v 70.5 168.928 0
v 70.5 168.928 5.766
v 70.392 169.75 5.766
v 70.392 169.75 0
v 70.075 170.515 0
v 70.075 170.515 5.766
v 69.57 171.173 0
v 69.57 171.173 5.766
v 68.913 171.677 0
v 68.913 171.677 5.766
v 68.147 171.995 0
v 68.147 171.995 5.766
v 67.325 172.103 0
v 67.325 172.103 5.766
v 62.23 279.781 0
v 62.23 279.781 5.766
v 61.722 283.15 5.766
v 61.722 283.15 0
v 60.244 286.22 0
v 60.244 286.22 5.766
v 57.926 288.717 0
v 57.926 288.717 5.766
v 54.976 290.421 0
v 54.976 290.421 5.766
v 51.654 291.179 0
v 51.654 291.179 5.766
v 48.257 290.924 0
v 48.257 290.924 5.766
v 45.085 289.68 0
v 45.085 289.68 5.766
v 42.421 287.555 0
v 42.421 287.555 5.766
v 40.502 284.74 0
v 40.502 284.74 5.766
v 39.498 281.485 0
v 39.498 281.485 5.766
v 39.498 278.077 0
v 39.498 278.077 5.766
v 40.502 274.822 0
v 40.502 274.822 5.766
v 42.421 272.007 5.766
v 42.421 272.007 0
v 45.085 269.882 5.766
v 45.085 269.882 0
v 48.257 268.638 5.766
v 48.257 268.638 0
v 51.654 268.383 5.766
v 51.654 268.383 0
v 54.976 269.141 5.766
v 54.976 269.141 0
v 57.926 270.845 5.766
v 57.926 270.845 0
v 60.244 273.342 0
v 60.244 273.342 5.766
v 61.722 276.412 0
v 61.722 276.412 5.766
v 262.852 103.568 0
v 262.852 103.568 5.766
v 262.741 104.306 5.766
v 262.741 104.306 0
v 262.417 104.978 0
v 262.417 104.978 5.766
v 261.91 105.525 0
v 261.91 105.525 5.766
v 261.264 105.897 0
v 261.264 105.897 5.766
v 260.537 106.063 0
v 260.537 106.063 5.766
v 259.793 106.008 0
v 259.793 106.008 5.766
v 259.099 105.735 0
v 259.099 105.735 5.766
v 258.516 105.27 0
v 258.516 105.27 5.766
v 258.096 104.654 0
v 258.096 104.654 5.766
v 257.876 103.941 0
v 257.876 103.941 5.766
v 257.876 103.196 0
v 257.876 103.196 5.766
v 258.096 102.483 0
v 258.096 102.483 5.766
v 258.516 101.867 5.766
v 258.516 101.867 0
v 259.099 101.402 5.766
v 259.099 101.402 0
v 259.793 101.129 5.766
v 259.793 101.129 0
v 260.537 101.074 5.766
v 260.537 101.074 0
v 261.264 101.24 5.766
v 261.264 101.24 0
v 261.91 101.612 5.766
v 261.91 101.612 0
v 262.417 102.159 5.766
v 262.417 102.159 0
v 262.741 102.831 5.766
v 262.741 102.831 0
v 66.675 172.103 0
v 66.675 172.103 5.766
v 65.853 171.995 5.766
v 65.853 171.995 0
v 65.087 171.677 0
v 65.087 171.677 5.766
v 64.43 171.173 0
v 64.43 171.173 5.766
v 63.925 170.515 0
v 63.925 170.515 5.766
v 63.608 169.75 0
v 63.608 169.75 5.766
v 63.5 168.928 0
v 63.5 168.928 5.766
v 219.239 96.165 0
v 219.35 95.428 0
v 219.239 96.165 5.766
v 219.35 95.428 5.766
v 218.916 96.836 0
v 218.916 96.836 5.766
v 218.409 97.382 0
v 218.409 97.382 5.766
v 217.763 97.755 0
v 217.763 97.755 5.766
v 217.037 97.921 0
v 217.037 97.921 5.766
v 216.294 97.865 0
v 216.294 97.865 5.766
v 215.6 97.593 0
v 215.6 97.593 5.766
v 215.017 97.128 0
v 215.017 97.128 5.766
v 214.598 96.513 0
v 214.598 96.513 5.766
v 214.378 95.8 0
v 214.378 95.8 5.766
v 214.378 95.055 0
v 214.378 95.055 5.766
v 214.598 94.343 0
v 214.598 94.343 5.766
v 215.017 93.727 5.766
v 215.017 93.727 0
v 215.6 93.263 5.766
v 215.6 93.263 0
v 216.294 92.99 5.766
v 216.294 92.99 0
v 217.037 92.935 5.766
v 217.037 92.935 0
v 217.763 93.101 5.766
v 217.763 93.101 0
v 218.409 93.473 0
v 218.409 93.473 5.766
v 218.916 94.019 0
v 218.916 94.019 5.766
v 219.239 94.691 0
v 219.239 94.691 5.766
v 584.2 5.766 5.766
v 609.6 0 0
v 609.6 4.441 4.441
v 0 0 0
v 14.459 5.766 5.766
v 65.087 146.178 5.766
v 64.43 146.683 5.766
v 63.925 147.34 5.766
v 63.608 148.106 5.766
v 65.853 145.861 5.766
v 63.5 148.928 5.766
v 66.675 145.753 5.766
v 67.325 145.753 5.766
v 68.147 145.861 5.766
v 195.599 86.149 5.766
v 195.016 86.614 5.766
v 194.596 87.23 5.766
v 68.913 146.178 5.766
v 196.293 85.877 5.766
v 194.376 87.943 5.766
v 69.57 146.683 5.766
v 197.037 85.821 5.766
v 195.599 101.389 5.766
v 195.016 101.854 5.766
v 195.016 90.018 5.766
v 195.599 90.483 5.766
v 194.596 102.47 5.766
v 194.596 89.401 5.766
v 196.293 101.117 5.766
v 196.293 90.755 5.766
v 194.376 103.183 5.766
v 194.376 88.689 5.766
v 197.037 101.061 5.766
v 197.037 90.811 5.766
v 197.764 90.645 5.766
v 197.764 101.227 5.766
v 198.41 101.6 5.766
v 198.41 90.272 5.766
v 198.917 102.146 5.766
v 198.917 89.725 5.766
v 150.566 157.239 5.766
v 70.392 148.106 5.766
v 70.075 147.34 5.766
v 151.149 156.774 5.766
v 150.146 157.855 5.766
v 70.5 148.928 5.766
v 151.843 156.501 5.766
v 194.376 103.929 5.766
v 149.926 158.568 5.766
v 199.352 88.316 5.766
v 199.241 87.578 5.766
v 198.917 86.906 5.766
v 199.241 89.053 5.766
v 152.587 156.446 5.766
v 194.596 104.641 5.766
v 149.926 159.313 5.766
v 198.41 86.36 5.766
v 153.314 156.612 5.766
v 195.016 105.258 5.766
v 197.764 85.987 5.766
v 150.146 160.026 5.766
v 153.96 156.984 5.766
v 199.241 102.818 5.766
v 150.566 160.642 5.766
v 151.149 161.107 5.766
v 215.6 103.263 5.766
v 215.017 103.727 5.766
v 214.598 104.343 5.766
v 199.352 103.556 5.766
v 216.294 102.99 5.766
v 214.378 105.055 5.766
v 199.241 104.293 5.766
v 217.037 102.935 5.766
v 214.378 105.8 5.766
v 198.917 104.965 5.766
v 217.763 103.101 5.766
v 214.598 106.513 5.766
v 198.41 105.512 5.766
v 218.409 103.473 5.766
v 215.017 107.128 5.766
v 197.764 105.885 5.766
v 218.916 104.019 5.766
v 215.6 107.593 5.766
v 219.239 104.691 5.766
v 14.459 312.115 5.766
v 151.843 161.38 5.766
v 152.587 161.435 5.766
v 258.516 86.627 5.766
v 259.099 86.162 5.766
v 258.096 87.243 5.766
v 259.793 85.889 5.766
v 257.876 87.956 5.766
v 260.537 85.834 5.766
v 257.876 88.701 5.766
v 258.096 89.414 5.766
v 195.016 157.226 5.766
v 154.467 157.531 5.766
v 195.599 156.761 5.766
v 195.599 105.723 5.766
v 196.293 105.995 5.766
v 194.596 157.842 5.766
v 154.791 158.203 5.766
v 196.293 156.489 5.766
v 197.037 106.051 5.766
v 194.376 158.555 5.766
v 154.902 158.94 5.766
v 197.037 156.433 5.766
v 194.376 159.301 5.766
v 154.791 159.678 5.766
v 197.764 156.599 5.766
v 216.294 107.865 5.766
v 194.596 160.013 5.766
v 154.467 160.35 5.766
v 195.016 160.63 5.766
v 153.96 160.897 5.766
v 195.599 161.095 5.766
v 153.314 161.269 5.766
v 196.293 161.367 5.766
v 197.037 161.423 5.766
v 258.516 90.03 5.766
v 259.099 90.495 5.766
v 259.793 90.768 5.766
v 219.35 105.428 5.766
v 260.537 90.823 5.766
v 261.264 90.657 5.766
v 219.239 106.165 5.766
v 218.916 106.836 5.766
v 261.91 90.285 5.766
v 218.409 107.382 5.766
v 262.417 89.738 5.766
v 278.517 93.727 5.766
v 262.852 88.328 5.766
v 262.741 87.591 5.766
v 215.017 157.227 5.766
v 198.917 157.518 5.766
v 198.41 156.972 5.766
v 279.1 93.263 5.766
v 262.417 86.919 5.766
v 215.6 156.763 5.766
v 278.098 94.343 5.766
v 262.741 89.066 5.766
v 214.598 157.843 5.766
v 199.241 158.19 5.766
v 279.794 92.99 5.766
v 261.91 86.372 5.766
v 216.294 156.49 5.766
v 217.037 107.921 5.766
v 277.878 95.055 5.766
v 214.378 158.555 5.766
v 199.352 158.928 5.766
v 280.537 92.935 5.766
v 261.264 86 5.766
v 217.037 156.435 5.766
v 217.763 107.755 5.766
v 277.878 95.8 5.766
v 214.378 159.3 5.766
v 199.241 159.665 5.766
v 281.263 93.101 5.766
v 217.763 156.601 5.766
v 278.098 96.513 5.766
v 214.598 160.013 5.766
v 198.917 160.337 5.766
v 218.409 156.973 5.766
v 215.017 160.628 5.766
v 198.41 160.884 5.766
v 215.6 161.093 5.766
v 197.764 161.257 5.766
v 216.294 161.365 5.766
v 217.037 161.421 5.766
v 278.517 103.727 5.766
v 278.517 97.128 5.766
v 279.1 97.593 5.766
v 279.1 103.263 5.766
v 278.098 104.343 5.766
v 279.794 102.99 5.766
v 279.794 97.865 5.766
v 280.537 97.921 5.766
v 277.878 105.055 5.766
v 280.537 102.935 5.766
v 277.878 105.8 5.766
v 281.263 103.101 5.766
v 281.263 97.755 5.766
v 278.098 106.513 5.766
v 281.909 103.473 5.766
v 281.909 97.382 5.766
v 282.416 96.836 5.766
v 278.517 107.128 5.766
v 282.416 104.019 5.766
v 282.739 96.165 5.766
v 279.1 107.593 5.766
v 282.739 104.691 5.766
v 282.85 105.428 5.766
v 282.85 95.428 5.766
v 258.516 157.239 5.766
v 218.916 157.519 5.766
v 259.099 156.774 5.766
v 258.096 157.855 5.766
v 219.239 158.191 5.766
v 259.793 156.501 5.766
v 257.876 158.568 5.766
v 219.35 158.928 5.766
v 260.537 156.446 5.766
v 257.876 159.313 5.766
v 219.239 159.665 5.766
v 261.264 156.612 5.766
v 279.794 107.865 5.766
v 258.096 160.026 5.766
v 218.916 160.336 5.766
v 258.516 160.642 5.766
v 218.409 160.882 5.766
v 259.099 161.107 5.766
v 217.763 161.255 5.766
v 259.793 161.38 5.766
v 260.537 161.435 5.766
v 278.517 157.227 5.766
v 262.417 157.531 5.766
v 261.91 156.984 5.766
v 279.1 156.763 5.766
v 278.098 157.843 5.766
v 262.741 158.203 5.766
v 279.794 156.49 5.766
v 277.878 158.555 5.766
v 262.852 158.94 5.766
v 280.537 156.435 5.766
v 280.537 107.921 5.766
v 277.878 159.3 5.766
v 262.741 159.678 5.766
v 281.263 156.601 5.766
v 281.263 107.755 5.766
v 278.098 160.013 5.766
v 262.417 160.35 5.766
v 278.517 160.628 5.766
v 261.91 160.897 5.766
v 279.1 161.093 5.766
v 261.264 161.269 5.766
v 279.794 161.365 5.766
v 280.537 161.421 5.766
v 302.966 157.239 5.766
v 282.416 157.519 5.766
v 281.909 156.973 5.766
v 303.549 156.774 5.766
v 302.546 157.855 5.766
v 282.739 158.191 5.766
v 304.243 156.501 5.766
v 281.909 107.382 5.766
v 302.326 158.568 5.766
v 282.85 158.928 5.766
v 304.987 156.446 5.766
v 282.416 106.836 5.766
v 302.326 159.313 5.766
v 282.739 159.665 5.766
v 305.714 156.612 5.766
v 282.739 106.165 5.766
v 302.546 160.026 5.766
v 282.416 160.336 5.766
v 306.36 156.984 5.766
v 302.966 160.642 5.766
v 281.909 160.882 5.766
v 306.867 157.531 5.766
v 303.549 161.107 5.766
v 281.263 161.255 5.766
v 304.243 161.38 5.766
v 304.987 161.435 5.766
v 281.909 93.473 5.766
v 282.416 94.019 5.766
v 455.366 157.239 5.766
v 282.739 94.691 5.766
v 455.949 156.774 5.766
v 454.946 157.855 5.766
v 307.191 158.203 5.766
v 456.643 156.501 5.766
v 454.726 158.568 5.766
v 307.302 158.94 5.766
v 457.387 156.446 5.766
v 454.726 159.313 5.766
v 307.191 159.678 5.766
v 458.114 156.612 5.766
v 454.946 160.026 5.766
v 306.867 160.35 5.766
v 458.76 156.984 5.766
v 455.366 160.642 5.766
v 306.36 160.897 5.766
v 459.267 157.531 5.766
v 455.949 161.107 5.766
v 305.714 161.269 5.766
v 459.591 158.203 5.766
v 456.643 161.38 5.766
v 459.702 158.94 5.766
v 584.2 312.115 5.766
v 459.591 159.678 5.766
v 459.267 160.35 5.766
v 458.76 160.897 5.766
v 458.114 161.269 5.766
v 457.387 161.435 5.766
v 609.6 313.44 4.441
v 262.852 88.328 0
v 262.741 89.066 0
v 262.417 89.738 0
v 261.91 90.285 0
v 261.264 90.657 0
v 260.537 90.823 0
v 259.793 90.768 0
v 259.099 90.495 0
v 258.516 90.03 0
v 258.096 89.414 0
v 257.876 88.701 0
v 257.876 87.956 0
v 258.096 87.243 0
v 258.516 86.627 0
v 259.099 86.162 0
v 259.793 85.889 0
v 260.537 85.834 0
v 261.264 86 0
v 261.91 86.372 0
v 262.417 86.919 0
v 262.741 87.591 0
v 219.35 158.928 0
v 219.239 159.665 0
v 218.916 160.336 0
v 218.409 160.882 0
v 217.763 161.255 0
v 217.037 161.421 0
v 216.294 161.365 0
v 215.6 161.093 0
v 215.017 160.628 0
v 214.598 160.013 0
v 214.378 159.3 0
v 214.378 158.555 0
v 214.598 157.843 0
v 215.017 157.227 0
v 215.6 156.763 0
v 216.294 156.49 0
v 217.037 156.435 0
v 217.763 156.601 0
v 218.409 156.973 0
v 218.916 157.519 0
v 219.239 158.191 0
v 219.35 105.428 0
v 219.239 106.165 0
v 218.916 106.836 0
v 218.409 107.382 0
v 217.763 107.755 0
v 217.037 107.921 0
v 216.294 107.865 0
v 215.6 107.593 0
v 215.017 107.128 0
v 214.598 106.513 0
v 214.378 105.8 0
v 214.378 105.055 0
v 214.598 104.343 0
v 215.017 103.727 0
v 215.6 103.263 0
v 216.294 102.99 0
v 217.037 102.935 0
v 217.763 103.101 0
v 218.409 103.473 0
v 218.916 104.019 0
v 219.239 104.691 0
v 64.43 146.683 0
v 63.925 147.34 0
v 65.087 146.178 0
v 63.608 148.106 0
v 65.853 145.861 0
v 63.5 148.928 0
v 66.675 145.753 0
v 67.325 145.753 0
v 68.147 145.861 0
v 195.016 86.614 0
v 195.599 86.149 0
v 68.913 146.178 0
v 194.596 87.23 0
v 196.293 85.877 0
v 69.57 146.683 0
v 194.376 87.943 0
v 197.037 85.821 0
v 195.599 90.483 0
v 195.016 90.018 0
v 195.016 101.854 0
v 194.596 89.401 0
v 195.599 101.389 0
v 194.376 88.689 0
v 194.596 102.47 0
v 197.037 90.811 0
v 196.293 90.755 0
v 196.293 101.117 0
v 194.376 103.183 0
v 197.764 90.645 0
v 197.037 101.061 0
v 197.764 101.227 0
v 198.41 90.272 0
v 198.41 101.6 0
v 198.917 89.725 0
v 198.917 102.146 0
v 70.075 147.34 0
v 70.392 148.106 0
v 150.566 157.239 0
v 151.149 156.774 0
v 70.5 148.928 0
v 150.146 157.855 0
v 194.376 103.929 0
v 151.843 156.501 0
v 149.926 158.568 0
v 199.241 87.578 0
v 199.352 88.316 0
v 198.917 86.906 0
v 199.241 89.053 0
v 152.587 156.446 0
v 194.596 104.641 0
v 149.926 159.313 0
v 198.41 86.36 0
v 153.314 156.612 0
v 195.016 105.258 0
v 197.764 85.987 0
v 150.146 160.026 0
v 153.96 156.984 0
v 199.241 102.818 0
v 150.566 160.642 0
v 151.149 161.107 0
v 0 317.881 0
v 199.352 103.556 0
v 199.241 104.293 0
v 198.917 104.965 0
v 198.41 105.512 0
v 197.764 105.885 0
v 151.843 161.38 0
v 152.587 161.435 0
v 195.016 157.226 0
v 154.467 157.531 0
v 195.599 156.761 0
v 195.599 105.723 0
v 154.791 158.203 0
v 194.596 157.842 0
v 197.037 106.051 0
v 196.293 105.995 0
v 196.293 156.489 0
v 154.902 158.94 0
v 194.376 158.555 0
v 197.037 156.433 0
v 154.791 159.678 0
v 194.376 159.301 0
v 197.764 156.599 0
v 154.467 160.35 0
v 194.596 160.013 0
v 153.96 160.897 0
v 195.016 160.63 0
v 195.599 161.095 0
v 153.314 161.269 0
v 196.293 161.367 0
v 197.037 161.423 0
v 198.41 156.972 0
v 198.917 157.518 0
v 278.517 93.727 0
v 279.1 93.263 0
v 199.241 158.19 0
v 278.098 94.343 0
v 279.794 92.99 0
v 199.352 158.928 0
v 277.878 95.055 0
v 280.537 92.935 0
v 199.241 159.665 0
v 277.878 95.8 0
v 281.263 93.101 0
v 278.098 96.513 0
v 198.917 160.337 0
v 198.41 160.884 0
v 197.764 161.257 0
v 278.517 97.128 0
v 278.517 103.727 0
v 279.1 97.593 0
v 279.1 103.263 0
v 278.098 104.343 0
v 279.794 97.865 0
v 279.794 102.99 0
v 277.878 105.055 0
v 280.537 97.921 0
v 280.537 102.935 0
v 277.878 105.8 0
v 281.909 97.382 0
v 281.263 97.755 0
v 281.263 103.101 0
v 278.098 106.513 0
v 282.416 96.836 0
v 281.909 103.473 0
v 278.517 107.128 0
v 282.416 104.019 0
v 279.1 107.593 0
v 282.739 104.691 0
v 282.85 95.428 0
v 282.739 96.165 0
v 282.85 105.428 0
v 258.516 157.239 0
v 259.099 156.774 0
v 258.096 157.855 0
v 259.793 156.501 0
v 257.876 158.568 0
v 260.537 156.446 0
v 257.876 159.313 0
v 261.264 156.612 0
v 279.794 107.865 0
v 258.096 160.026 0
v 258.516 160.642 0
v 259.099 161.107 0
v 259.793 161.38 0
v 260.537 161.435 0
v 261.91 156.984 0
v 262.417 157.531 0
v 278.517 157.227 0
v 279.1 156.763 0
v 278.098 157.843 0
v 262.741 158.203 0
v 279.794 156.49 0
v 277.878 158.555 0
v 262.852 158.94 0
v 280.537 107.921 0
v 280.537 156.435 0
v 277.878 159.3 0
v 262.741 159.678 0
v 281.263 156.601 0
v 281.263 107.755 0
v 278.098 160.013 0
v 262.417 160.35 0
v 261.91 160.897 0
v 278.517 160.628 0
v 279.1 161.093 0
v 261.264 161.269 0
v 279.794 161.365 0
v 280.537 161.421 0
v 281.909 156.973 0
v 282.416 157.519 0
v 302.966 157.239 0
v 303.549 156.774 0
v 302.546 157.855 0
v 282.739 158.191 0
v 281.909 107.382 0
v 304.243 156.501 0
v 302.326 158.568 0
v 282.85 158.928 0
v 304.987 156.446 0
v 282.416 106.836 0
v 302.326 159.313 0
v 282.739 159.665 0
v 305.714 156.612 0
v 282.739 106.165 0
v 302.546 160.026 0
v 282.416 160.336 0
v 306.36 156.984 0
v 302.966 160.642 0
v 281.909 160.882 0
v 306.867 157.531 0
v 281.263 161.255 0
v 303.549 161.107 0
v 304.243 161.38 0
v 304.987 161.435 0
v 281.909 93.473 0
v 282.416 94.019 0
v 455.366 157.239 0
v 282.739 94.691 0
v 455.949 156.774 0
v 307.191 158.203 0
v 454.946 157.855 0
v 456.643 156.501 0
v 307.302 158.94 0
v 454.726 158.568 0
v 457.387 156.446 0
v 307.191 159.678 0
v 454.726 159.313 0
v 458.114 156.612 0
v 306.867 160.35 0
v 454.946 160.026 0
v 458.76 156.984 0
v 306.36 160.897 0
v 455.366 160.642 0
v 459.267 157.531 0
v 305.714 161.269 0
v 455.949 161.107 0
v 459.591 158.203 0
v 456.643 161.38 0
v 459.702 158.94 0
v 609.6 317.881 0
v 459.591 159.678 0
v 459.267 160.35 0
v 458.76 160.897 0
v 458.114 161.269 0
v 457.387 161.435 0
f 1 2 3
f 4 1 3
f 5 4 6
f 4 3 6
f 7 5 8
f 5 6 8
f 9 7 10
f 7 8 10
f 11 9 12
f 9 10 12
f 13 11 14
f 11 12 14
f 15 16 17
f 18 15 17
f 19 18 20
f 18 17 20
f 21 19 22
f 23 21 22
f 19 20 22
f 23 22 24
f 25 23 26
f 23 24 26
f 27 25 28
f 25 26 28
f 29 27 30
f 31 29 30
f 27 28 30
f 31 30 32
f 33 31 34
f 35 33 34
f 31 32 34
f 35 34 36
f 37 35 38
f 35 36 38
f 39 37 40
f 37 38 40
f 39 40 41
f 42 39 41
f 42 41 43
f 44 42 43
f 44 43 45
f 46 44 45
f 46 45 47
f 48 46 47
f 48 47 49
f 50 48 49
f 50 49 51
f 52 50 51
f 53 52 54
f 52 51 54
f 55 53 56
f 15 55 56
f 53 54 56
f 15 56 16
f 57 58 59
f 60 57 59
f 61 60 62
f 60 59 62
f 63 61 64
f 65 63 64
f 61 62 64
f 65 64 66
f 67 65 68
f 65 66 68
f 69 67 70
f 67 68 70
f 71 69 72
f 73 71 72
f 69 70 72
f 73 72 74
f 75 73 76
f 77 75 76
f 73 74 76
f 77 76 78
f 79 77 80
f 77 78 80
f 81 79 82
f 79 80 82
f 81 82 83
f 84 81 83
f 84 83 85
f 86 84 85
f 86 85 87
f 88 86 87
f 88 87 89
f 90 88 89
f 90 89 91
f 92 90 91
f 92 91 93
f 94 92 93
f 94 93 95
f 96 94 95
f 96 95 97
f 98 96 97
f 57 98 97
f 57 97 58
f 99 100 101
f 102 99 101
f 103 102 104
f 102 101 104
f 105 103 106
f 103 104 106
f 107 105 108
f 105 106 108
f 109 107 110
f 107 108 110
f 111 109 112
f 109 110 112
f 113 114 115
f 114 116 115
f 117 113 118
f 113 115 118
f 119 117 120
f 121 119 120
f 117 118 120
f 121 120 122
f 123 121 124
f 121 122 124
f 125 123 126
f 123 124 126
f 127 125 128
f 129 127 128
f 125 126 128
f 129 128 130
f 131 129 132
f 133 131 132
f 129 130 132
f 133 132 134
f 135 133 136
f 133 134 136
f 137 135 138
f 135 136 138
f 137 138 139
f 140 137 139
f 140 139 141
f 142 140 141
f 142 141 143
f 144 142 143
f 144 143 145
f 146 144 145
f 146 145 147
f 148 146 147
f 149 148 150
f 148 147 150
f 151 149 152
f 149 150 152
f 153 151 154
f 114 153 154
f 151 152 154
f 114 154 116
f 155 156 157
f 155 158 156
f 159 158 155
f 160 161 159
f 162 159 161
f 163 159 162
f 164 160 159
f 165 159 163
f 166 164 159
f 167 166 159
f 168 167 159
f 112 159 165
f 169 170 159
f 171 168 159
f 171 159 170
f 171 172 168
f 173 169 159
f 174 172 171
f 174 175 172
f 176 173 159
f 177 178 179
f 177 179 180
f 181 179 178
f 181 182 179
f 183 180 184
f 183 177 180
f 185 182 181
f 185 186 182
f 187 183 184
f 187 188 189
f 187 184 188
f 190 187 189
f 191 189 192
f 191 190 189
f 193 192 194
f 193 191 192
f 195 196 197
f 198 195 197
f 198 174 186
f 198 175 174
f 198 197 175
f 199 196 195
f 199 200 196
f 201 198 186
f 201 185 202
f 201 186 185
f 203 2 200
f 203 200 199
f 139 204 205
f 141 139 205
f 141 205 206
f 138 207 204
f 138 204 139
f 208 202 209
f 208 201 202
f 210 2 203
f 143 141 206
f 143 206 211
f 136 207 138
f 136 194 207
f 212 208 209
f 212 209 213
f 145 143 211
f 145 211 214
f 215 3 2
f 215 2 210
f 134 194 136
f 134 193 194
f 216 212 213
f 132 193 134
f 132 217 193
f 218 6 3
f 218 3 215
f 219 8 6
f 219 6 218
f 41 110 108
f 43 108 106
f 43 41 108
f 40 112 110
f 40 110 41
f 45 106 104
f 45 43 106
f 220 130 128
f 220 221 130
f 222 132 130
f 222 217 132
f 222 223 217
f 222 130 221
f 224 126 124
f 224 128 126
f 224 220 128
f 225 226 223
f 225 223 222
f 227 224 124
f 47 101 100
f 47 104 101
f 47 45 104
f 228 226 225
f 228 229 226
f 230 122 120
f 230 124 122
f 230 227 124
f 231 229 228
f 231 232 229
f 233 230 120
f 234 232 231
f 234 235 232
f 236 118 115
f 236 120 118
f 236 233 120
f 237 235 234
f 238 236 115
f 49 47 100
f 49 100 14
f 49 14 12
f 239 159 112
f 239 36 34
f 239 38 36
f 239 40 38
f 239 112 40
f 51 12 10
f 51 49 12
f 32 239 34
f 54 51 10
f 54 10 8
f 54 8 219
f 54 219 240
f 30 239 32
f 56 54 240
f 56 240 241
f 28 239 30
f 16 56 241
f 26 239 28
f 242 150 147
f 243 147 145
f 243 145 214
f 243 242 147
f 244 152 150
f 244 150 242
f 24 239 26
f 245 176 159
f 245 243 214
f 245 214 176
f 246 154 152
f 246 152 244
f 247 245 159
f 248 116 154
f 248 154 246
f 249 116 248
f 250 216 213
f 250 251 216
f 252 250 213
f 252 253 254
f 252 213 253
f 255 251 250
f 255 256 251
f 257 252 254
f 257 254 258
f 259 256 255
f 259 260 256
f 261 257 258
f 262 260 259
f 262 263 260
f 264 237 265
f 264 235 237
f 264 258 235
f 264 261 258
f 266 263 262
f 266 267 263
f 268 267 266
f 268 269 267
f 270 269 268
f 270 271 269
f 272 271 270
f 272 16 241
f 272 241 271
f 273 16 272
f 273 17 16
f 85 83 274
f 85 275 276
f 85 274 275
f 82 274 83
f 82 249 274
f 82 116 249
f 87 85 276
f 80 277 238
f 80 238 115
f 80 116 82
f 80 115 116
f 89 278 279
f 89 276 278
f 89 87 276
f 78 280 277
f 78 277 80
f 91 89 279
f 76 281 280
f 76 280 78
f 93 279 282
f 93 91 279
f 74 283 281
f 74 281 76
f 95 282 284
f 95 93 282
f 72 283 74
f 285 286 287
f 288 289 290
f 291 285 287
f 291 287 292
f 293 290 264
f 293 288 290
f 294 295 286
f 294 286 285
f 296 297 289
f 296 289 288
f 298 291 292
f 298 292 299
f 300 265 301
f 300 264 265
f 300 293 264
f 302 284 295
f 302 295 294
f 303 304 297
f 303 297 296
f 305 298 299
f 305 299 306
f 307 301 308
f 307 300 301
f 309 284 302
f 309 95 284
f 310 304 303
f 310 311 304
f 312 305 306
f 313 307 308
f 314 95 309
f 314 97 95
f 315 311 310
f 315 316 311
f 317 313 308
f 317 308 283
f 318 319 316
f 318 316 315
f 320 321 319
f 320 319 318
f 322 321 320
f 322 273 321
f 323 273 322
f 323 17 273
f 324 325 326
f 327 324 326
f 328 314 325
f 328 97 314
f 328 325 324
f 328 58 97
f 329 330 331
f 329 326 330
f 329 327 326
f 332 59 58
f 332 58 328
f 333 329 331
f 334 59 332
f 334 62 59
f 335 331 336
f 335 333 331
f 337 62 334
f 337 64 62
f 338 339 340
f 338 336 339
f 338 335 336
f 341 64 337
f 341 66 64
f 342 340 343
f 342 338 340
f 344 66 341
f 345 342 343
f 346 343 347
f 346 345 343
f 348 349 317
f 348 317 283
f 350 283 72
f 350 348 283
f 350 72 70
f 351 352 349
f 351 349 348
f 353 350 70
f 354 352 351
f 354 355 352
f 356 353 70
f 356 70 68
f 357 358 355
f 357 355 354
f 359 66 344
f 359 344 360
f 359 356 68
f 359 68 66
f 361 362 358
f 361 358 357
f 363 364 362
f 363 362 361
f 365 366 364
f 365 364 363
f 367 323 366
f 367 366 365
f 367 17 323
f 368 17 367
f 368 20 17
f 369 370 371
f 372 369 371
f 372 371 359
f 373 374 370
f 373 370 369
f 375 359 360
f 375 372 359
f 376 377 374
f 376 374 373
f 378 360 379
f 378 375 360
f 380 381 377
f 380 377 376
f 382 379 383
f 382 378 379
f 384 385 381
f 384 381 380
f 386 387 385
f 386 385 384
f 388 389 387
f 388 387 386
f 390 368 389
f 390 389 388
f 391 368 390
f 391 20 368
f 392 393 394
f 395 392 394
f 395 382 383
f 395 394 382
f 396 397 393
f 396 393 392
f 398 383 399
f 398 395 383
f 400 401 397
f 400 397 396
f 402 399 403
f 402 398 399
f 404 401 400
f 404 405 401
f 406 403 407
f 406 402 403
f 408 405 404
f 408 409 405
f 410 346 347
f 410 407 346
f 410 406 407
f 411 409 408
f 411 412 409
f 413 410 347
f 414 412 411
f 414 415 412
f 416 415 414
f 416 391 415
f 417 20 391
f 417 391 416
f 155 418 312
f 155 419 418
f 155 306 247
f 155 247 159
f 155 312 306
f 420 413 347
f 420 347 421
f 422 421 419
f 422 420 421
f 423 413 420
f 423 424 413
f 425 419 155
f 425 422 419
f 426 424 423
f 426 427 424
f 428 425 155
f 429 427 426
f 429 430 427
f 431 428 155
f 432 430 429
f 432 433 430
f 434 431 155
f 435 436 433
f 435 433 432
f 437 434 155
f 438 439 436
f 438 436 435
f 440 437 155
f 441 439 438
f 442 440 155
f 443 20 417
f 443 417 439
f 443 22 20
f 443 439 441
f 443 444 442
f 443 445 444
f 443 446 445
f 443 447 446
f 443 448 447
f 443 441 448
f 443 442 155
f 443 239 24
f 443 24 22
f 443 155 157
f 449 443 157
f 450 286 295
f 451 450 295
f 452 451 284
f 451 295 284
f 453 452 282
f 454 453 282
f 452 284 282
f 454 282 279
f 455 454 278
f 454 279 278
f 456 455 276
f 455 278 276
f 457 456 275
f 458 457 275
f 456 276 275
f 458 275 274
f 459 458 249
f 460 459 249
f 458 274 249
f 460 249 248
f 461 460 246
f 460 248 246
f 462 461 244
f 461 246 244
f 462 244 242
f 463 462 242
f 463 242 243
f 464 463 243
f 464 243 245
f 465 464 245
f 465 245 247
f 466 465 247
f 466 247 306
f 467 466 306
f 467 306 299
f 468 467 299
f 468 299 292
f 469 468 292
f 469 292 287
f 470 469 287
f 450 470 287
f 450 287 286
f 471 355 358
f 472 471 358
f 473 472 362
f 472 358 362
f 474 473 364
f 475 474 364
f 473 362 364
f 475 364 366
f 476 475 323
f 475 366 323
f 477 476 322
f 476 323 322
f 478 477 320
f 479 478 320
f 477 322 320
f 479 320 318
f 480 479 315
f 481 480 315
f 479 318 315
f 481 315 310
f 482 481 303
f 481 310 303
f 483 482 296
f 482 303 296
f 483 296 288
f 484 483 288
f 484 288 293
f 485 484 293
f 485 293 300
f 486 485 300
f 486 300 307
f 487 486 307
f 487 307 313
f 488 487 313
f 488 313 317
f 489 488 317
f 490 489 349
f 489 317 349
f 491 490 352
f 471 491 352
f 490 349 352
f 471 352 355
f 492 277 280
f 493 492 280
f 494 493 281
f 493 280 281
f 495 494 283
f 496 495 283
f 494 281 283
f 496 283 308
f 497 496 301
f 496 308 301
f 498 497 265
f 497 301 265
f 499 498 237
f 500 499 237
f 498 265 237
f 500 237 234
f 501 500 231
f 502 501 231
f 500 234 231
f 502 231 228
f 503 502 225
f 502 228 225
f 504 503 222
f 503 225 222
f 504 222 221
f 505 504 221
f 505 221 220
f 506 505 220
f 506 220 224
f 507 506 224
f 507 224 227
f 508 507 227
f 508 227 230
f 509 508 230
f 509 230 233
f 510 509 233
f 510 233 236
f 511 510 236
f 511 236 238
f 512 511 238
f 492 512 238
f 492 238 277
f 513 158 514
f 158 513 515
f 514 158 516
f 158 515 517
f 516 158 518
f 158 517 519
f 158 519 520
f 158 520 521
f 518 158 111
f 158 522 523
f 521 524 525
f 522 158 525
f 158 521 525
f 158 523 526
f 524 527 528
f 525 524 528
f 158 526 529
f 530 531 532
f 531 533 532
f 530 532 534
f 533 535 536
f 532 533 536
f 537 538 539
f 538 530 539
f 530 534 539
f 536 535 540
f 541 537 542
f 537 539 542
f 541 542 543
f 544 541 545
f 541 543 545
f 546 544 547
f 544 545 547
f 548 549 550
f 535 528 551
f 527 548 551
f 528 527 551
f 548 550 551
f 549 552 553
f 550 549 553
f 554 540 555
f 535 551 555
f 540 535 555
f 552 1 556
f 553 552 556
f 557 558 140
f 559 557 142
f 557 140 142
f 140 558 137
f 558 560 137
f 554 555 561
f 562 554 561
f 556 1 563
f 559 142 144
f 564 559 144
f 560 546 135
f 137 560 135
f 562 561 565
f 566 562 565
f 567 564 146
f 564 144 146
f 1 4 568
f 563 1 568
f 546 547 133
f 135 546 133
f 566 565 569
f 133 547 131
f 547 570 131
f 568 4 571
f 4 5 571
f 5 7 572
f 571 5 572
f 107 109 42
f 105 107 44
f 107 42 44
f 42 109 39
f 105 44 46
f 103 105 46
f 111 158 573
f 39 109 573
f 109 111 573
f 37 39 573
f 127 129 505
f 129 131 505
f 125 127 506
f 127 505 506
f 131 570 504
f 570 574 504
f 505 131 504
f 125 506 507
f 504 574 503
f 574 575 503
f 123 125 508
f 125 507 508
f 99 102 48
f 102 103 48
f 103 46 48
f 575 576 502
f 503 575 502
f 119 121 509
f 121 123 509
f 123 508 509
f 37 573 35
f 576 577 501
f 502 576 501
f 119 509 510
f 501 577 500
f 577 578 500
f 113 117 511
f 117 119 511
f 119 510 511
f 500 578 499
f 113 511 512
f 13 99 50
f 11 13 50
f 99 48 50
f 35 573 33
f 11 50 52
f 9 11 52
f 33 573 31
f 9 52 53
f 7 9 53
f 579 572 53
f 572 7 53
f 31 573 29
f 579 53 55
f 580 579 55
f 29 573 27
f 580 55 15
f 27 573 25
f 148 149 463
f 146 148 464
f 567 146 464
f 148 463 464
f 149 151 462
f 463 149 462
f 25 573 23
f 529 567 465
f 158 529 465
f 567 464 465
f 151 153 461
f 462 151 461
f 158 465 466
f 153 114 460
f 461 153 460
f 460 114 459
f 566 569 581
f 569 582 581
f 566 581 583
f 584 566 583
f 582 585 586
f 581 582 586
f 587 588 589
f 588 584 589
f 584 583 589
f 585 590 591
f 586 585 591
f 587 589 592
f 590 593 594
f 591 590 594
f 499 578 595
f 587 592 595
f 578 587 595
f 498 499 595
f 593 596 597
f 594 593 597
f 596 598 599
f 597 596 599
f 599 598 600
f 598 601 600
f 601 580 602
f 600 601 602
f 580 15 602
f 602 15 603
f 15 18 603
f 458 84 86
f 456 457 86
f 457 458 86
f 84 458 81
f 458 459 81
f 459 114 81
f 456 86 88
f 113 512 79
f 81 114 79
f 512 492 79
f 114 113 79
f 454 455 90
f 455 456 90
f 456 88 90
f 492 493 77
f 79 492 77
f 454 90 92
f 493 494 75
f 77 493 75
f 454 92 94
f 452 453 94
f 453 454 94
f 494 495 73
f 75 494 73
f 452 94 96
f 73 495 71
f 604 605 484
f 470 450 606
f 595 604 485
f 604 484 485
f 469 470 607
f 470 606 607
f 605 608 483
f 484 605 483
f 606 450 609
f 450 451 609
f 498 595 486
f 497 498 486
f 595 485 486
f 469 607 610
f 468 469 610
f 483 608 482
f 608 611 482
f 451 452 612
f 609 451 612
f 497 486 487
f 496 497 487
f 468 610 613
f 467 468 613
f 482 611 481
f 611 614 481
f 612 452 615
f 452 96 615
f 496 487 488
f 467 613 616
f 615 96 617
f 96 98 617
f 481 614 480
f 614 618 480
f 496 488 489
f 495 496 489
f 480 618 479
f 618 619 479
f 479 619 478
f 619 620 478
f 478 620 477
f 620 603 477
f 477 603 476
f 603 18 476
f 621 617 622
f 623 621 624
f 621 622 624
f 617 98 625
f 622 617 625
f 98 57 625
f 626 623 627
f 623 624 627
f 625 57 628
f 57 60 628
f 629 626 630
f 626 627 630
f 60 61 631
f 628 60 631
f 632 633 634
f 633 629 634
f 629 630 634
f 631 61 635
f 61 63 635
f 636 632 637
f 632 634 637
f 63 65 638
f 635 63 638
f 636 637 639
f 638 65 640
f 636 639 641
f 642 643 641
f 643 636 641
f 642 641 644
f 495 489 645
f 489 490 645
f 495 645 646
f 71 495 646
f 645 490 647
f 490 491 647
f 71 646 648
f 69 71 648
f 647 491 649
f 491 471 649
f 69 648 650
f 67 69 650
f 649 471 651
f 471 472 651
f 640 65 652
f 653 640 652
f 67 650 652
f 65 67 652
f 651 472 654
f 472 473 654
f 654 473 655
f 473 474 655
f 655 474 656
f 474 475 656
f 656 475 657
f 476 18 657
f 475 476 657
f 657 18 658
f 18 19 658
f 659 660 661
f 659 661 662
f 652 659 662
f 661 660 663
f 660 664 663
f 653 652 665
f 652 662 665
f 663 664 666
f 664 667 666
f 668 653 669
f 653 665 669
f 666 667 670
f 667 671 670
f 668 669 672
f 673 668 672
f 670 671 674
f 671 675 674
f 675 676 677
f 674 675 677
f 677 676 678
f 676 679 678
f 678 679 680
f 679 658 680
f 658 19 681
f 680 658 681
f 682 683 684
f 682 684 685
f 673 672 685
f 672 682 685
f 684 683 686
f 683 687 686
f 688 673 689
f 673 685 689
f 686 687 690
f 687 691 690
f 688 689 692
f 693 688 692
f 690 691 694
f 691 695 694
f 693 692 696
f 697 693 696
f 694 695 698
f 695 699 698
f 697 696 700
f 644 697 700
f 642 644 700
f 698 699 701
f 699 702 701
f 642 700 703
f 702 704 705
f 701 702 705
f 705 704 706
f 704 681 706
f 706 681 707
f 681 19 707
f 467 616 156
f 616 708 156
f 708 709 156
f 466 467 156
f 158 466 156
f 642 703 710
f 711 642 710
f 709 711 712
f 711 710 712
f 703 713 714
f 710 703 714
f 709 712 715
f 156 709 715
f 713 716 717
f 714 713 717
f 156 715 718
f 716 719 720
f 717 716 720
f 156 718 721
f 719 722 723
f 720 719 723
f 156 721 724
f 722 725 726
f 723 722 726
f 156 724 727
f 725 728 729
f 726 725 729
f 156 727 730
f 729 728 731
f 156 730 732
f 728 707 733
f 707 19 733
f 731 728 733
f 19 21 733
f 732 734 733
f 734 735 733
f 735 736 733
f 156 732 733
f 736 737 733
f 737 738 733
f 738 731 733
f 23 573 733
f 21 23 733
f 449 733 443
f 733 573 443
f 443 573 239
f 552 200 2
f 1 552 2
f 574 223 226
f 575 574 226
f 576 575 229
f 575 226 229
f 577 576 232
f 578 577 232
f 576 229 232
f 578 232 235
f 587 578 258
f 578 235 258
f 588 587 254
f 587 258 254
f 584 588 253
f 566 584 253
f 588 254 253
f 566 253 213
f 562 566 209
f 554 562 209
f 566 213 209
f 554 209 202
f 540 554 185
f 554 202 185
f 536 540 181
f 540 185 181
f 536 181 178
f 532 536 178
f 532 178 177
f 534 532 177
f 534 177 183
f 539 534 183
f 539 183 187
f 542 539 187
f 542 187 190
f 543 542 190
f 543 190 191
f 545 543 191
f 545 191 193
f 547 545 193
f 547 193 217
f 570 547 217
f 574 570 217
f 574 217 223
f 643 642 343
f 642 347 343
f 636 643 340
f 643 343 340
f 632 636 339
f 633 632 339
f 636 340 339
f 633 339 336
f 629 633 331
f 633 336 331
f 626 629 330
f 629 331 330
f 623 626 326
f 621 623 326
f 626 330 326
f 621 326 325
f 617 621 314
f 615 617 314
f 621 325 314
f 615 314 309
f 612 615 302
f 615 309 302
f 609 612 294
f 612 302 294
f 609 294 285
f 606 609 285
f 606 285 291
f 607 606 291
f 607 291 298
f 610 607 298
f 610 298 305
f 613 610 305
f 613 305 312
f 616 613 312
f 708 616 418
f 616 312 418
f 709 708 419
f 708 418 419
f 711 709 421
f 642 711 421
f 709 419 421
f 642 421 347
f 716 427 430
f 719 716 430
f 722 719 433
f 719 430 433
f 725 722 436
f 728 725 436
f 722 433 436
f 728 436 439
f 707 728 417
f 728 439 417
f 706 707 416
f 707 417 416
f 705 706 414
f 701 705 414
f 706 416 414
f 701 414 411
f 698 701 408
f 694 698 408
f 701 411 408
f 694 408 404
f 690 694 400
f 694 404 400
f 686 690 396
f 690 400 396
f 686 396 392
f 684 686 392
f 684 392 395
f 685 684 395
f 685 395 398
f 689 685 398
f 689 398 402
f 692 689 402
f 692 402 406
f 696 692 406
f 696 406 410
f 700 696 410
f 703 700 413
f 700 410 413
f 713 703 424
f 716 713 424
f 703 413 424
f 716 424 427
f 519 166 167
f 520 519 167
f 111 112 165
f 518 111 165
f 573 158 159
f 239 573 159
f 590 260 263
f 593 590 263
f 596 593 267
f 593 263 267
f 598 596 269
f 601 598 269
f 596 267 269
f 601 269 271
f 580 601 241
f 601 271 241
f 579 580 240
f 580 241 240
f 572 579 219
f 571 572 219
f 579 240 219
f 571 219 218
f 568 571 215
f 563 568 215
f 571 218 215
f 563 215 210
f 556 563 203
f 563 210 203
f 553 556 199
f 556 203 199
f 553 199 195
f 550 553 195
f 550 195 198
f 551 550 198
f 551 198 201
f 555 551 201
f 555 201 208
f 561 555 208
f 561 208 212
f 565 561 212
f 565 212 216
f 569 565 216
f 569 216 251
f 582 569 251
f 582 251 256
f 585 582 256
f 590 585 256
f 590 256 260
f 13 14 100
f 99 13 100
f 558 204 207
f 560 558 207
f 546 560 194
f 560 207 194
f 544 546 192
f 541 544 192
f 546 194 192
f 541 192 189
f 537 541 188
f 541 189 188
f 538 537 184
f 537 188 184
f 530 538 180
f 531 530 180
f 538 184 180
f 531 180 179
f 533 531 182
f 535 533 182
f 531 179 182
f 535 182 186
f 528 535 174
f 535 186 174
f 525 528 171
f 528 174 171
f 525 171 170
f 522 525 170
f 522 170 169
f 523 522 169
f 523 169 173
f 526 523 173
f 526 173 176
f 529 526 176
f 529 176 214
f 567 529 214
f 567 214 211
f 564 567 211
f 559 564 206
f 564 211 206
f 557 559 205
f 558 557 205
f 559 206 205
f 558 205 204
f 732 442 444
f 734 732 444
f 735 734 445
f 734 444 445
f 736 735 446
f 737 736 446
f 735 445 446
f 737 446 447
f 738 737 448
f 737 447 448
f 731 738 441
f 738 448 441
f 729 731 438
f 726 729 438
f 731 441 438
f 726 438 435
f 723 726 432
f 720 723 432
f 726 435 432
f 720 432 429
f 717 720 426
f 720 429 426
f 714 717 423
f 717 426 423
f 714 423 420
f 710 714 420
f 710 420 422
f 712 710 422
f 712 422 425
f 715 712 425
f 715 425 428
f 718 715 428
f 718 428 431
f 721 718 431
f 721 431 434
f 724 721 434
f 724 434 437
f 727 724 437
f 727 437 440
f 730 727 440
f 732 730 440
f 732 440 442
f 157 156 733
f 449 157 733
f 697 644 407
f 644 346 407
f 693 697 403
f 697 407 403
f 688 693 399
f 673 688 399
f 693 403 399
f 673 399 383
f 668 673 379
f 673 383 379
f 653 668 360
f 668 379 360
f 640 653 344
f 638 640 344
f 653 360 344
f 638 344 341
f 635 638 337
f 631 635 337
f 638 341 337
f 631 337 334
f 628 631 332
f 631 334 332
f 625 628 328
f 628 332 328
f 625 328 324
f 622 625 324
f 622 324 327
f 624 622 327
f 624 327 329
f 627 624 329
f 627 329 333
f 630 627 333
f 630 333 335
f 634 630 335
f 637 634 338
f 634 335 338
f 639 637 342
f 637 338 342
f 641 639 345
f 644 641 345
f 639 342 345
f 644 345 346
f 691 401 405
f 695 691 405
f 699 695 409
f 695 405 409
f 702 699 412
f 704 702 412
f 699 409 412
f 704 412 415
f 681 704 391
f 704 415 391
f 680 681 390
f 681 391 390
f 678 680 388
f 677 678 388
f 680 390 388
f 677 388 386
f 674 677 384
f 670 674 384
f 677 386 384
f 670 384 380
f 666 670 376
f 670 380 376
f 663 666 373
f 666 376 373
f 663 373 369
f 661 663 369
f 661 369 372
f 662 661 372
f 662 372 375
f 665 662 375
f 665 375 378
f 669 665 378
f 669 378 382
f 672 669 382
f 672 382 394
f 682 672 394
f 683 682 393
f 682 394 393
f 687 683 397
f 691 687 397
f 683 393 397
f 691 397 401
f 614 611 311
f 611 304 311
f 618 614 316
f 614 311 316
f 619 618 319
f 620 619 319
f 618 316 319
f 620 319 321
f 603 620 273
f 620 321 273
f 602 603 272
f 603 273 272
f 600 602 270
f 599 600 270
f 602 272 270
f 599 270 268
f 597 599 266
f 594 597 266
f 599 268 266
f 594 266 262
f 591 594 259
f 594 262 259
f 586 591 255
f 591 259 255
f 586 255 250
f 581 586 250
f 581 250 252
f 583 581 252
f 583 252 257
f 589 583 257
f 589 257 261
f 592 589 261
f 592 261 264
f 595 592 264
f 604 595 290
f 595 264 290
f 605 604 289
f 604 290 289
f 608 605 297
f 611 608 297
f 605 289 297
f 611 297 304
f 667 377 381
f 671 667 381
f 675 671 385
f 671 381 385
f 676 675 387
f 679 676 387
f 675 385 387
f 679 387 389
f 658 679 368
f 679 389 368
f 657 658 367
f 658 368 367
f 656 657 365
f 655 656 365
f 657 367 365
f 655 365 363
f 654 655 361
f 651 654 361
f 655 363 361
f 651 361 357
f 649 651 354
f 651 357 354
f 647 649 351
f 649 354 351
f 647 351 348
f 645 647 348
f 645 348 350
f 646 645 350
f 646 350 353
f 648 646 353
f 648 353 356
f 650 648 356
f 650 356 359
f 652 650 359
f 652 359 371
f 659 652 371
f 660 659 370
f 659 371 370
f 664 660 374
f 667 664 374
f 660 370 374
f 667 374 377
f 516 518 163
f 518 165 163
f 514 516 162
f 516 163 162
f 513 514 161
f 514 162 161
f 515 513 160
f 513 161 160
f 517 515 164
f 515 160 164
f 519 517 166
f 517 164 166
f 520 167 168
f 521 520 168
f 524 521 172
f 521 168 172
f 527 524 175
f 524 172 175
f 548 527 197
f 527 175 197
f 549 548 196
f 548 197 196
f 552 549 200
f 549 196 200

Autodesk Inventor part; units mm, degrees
ref_plane "YZ Plane" through (0, 0, 0) normal (1, 0, 0) x (0, 1, 0)
ref_plane "XY Plane" through (0, 0, 0) normal (0, 0, 1) x (1, 0, 0)
sketch "Sketch1" plane through (0, 0, 0) normal (0, 0, 1) x (1, 0, 0)
  line L0 (0, 0) -> (609.6, 0)
  line L1 (609.6, 0) -> (609.6, 317.881)
  line L2 (609.6, 317.881) -> (0, 317.881)
  line L3 (0, 317.881) -> (0, 0)
  dimension "d0" = 609.6
  dimension "d1" = 317.881
extrude "Extrusion1" add sketch "Sketch1" along normal blind 5.7658
sketch "Sketch2" plane through (0, 317.881, 0) normal (0, 1, 0) x (1, 0, 0)
  line L0 (609.6, 0) -> (0, 0) projected
  line L1 (0, 0) -> (0, -5.7658) projected
  line L2 (609.6, -5.7658) -> (0, -5.7658) projected
  line L3 (609.6, 0) -> (609.6, -5.7658) projected
  line L4 (0, 0) -> (609.6, 0) projected
  line L5 (0, 0) -> (14.4594, -5.7658)
  line L6 (0, -5.7658) -> (609.6, -5.7658) projected
  line L7 (14.4594, -5.7658) -> (14.4594, 0)
  line L8 (14.4594, -5.7658) -> (20.2252, -5.7658) construction
  dimension "d4" = 21.74
  dimension "d5" = 90
extrude "Extrusion2" cut sketch "Sketch2" against normal through all contours L5 L2 L1
sketch "Sketch3" plane through (609.6, 0, 0) normal (1, 0, 0) x (0, 0, -1)
  line L0 (0, 0) -> (0, 317.881) projected
  line L1 (0, 317.881) -> (-5.7658, 317.881) projected
  line L2 (-5.7658, 0) -> (-5.7658, 317.881) projected
  line L3 (0, 0) -> (-5.7658, 0) projected
  line L4 (0, 0) -> (-5.7658, 0) projected
  line L5 (0, 0) -> (-5.7658, 5.7658)
  line L6 (-5.7658, 0) -> (-5.7658, 317.881) projected
  line L7 (0, 0) -> (8.1541, 0) construction
  line L8 (0, 317.881) -> (-5.7658, 317.881) projected
  line L9 (0, 317.881) -> (-5.7658, 312.1152)
  line L10 (0, 317.881) -> (8.1541, 317.881) construction
  dimension "d8" = 135
  dimension "d9" = 135
extrude "Extrusion3" cut sketch "Sketch3" against normal through all contours L3 L2 L5 | L9 L2 L1
ref_plane "Center Plane" through (0, 158.9405, 0) normal (0, 1, 0) x (-1, 0, 0)
sketch "Sketch4" plane through (0, 158.9405, 0) normal (0, 1, 0) x (-1, 0, 0)
  line L0 (-14.4594, 5.7658) -> (0, 0) projected
  line L1 (-609.6, 5.7658) -> (-14.4594, 5.7658) projected
  line L2 (-609.6, 0) -> (-609.6, 5.7658) projected
  line L3 (-609.6, 0) -> (0, 0) projected
  line L4 (-609.6, 5.7658) -> (-584.2, 5.7658) construction
  line L5 (-584.2, 5.7658) -> (-609.6, 4.4413)
  point P0 (0, 0)
  dimension "d13" = 25.4
  dimension "d14" = 2.985
extrude "Extrusion4" cut sketch "Sketch4" against normal through all both and the other way through all contours L5 L2 L1
sketch "Sketch5" plane through (0, 0, 5.7658) normal (0, 0, 1) x (1, 0, 0)
  circle A0 centre (196.85, 158.9278) radius 2.5019
  line L0 (0, 317.881) -> (0, 0) projected
  line L1 (609.6, 317.881) -> (0, 317.881) projected
  circle A1 centre (260.35, 158.9405) radius 2.5019
  circle A2 centre (196.85, 103.5558) radius 2.5019
  circle A3 centre (260.35, 103.5685) radius 2.5019
  circle A4 centre (196.85, 88.3158) radius 2.5019
  circle A5 centre (260.35, 88.3285) radius 2.5019
  circle A6 centre (152.4, 158.9405) radius 2.5019
  circle A7 centre (304.8, 158.9405) radius 2.5019
  circle A8 centre (457.2, 158.9405) radius 2.5019
  line L2 (66.675, 145.7528) -> (67.325, 145.7528)
  line L3 (70.5, 148.9278) -> (70.5, 168.9278)
  line L4 (67.325, 172.1028) -> (66.675, 172.1028)
  line L5 (63.5, 168.9278) -> (63.5, 148.9278)
  line L6 (63.5, 145.7528) -> (70.5, 172.1028) construction
  line L7 (70.5, 145.7528) -> (63.5, 172.1028) construction
  arc A9 (70.5, 168.9278) -> (67.325, 172.1028) centre (67.325, 168.9278) ccw
  arc A10 (66.675, 172.1028) -> (63.5, 168.9278) centre (66.675, 168.9278) ccw
  arc A11 (63.5, 148.9278) -> (66.675, 145.7528) centre (66.675, 148.9278) ccw
  arc A12 (67.325, 145.7528) -> (70.5, 148.9278) centre (67.325, 148.9278) ccw
  point P0 (67, 158.9278)
  dimension "d17" = 196.85
  dimension "d18" = 158.9532
  dimension "d19" = 5.0038
  dimension "d20" = 63.5
  dimension "d21" = 5.0038
  dimension "d22" = 55.372
  dimension "d23" = 55.372
  dimension "d24" = 196.85
  dimension "d25" = 63.5
  dimension "d26" = 158.9405
  dimension "d27" = 5.0038
  dimension "d28" = 5.0038
  dimension "d29" = 15.24
  dimension "d30" = 15.24
  dimension "d31" = 5.0038
  dimension "d32" = 5.0038
  dimension "d33" = 63.5
  dimension "d34" = 196.85
  dimension "d35" = 152.4
  dimension "d36" = 5.0038
  dimension "d37" = 158.9405
  dimension "d38" = 304.8
  dimension "d39" = 5.0038
  dimension "d40" = 158.9405
  dimension "d41" = 457.2
  dimension "d42" = 158.9405
  dimension "d43" = 5.0038
  dimension "d44" = 3.175
  dimension "d45" = 7
  dimension "d46" = 20
  dimension "d47" = 158.9532
  dimension "d48" = 63.5
extrude "Extrusion5" cut sketch "Sketch5" against normal through all
sketch "Sketch6" plane through (0, 0, 5.7658) normal (0, 0, 1) x (1, 0, 0)
  circle A0 centre (50.8, 279.781) radius 11.43
  line L0 (609.6, 317.881) -> (0, 317.881) projected
  line L1 (0, 317.881) -> (0, 0) projected
  dimension "d51" = 38.1
  dimension "d52" = 50.8
  dimension "d53" = 22.86
extrude "Extrusion6" cut sketch "Sketch6" against normal through all
sketch "Sketch7" plane through (0, 0, 5.7658) normal (0, 0, 1) x (1, 0, 0)
  circle A0 centre (216.85, 158.9278) radius 2.5
  circle A1 centre (196.85, 103.5558) radius 2.5019 construction
  circle A2 centre (196.85, 158.9278) radius 2.5019 construction
  line L0 (196.85, 103.5558) -> (196.85, 158.9278) construction
  line L1 (196.85, 158.9278) -> (216.85, 158.9278) construction
  line L2 (216.85, 158.9278) -> (216.85, 105.4278) construction
  circle A3 centre (216.85, 105.4278) radius 2.5
  circle A4 centre (196.85, 88.3158) radius 2.5019 construction
  line L3 (196.85, 103.5558) -> (196.85, 88.3158) construction
  line L4 (216.85, 95.4278) -> (216.85, 105.4278) construction
  circle A5 centre (216.85, 95.4278) radius 2.5
  line L5 (216.85, 158.9278) -> (280.35, 158.9278) construction
  line L6 (280.35, 158.9278) -> (280.35, 95.4278) construction
  line L7 (280.35, 95.4278) -> (280.35, 105.4278) construction
  circle A6 centre (280.35, 105.4278) radius 2.5
  circle A7 centre (280.35, 95.4278) radius 2.5
  circle A8 centre (280.35, 158.9278) radius 2.5
  circle A9 centre (260.35, 158.9405) radius 2.5019 projected
  point P0 (0, 0)
  dimension "d56" = 5
  dimension "d57" = 20
  dimension "d58" = 5
  dimension "d59" = 5
  dimension "d60" = 63.5
  dimension "d61" = 5
  dimension "d62" = 5
  dimension "d63" = 5
  dimension "d64" = 63.5
  dimension "d65" = 63.5
  dimension "d66" = 10
  dimension "d67" = 180
  dimension "d68" = 10
extrude "Extrusion7" cut sketch "Sketch7" against normal through all contours A0 | A3 | A5 | A6 | A7 | A8
properties part number "Wind Tunnel Test Section Bottom" material "Polycarbonate, Clear"
